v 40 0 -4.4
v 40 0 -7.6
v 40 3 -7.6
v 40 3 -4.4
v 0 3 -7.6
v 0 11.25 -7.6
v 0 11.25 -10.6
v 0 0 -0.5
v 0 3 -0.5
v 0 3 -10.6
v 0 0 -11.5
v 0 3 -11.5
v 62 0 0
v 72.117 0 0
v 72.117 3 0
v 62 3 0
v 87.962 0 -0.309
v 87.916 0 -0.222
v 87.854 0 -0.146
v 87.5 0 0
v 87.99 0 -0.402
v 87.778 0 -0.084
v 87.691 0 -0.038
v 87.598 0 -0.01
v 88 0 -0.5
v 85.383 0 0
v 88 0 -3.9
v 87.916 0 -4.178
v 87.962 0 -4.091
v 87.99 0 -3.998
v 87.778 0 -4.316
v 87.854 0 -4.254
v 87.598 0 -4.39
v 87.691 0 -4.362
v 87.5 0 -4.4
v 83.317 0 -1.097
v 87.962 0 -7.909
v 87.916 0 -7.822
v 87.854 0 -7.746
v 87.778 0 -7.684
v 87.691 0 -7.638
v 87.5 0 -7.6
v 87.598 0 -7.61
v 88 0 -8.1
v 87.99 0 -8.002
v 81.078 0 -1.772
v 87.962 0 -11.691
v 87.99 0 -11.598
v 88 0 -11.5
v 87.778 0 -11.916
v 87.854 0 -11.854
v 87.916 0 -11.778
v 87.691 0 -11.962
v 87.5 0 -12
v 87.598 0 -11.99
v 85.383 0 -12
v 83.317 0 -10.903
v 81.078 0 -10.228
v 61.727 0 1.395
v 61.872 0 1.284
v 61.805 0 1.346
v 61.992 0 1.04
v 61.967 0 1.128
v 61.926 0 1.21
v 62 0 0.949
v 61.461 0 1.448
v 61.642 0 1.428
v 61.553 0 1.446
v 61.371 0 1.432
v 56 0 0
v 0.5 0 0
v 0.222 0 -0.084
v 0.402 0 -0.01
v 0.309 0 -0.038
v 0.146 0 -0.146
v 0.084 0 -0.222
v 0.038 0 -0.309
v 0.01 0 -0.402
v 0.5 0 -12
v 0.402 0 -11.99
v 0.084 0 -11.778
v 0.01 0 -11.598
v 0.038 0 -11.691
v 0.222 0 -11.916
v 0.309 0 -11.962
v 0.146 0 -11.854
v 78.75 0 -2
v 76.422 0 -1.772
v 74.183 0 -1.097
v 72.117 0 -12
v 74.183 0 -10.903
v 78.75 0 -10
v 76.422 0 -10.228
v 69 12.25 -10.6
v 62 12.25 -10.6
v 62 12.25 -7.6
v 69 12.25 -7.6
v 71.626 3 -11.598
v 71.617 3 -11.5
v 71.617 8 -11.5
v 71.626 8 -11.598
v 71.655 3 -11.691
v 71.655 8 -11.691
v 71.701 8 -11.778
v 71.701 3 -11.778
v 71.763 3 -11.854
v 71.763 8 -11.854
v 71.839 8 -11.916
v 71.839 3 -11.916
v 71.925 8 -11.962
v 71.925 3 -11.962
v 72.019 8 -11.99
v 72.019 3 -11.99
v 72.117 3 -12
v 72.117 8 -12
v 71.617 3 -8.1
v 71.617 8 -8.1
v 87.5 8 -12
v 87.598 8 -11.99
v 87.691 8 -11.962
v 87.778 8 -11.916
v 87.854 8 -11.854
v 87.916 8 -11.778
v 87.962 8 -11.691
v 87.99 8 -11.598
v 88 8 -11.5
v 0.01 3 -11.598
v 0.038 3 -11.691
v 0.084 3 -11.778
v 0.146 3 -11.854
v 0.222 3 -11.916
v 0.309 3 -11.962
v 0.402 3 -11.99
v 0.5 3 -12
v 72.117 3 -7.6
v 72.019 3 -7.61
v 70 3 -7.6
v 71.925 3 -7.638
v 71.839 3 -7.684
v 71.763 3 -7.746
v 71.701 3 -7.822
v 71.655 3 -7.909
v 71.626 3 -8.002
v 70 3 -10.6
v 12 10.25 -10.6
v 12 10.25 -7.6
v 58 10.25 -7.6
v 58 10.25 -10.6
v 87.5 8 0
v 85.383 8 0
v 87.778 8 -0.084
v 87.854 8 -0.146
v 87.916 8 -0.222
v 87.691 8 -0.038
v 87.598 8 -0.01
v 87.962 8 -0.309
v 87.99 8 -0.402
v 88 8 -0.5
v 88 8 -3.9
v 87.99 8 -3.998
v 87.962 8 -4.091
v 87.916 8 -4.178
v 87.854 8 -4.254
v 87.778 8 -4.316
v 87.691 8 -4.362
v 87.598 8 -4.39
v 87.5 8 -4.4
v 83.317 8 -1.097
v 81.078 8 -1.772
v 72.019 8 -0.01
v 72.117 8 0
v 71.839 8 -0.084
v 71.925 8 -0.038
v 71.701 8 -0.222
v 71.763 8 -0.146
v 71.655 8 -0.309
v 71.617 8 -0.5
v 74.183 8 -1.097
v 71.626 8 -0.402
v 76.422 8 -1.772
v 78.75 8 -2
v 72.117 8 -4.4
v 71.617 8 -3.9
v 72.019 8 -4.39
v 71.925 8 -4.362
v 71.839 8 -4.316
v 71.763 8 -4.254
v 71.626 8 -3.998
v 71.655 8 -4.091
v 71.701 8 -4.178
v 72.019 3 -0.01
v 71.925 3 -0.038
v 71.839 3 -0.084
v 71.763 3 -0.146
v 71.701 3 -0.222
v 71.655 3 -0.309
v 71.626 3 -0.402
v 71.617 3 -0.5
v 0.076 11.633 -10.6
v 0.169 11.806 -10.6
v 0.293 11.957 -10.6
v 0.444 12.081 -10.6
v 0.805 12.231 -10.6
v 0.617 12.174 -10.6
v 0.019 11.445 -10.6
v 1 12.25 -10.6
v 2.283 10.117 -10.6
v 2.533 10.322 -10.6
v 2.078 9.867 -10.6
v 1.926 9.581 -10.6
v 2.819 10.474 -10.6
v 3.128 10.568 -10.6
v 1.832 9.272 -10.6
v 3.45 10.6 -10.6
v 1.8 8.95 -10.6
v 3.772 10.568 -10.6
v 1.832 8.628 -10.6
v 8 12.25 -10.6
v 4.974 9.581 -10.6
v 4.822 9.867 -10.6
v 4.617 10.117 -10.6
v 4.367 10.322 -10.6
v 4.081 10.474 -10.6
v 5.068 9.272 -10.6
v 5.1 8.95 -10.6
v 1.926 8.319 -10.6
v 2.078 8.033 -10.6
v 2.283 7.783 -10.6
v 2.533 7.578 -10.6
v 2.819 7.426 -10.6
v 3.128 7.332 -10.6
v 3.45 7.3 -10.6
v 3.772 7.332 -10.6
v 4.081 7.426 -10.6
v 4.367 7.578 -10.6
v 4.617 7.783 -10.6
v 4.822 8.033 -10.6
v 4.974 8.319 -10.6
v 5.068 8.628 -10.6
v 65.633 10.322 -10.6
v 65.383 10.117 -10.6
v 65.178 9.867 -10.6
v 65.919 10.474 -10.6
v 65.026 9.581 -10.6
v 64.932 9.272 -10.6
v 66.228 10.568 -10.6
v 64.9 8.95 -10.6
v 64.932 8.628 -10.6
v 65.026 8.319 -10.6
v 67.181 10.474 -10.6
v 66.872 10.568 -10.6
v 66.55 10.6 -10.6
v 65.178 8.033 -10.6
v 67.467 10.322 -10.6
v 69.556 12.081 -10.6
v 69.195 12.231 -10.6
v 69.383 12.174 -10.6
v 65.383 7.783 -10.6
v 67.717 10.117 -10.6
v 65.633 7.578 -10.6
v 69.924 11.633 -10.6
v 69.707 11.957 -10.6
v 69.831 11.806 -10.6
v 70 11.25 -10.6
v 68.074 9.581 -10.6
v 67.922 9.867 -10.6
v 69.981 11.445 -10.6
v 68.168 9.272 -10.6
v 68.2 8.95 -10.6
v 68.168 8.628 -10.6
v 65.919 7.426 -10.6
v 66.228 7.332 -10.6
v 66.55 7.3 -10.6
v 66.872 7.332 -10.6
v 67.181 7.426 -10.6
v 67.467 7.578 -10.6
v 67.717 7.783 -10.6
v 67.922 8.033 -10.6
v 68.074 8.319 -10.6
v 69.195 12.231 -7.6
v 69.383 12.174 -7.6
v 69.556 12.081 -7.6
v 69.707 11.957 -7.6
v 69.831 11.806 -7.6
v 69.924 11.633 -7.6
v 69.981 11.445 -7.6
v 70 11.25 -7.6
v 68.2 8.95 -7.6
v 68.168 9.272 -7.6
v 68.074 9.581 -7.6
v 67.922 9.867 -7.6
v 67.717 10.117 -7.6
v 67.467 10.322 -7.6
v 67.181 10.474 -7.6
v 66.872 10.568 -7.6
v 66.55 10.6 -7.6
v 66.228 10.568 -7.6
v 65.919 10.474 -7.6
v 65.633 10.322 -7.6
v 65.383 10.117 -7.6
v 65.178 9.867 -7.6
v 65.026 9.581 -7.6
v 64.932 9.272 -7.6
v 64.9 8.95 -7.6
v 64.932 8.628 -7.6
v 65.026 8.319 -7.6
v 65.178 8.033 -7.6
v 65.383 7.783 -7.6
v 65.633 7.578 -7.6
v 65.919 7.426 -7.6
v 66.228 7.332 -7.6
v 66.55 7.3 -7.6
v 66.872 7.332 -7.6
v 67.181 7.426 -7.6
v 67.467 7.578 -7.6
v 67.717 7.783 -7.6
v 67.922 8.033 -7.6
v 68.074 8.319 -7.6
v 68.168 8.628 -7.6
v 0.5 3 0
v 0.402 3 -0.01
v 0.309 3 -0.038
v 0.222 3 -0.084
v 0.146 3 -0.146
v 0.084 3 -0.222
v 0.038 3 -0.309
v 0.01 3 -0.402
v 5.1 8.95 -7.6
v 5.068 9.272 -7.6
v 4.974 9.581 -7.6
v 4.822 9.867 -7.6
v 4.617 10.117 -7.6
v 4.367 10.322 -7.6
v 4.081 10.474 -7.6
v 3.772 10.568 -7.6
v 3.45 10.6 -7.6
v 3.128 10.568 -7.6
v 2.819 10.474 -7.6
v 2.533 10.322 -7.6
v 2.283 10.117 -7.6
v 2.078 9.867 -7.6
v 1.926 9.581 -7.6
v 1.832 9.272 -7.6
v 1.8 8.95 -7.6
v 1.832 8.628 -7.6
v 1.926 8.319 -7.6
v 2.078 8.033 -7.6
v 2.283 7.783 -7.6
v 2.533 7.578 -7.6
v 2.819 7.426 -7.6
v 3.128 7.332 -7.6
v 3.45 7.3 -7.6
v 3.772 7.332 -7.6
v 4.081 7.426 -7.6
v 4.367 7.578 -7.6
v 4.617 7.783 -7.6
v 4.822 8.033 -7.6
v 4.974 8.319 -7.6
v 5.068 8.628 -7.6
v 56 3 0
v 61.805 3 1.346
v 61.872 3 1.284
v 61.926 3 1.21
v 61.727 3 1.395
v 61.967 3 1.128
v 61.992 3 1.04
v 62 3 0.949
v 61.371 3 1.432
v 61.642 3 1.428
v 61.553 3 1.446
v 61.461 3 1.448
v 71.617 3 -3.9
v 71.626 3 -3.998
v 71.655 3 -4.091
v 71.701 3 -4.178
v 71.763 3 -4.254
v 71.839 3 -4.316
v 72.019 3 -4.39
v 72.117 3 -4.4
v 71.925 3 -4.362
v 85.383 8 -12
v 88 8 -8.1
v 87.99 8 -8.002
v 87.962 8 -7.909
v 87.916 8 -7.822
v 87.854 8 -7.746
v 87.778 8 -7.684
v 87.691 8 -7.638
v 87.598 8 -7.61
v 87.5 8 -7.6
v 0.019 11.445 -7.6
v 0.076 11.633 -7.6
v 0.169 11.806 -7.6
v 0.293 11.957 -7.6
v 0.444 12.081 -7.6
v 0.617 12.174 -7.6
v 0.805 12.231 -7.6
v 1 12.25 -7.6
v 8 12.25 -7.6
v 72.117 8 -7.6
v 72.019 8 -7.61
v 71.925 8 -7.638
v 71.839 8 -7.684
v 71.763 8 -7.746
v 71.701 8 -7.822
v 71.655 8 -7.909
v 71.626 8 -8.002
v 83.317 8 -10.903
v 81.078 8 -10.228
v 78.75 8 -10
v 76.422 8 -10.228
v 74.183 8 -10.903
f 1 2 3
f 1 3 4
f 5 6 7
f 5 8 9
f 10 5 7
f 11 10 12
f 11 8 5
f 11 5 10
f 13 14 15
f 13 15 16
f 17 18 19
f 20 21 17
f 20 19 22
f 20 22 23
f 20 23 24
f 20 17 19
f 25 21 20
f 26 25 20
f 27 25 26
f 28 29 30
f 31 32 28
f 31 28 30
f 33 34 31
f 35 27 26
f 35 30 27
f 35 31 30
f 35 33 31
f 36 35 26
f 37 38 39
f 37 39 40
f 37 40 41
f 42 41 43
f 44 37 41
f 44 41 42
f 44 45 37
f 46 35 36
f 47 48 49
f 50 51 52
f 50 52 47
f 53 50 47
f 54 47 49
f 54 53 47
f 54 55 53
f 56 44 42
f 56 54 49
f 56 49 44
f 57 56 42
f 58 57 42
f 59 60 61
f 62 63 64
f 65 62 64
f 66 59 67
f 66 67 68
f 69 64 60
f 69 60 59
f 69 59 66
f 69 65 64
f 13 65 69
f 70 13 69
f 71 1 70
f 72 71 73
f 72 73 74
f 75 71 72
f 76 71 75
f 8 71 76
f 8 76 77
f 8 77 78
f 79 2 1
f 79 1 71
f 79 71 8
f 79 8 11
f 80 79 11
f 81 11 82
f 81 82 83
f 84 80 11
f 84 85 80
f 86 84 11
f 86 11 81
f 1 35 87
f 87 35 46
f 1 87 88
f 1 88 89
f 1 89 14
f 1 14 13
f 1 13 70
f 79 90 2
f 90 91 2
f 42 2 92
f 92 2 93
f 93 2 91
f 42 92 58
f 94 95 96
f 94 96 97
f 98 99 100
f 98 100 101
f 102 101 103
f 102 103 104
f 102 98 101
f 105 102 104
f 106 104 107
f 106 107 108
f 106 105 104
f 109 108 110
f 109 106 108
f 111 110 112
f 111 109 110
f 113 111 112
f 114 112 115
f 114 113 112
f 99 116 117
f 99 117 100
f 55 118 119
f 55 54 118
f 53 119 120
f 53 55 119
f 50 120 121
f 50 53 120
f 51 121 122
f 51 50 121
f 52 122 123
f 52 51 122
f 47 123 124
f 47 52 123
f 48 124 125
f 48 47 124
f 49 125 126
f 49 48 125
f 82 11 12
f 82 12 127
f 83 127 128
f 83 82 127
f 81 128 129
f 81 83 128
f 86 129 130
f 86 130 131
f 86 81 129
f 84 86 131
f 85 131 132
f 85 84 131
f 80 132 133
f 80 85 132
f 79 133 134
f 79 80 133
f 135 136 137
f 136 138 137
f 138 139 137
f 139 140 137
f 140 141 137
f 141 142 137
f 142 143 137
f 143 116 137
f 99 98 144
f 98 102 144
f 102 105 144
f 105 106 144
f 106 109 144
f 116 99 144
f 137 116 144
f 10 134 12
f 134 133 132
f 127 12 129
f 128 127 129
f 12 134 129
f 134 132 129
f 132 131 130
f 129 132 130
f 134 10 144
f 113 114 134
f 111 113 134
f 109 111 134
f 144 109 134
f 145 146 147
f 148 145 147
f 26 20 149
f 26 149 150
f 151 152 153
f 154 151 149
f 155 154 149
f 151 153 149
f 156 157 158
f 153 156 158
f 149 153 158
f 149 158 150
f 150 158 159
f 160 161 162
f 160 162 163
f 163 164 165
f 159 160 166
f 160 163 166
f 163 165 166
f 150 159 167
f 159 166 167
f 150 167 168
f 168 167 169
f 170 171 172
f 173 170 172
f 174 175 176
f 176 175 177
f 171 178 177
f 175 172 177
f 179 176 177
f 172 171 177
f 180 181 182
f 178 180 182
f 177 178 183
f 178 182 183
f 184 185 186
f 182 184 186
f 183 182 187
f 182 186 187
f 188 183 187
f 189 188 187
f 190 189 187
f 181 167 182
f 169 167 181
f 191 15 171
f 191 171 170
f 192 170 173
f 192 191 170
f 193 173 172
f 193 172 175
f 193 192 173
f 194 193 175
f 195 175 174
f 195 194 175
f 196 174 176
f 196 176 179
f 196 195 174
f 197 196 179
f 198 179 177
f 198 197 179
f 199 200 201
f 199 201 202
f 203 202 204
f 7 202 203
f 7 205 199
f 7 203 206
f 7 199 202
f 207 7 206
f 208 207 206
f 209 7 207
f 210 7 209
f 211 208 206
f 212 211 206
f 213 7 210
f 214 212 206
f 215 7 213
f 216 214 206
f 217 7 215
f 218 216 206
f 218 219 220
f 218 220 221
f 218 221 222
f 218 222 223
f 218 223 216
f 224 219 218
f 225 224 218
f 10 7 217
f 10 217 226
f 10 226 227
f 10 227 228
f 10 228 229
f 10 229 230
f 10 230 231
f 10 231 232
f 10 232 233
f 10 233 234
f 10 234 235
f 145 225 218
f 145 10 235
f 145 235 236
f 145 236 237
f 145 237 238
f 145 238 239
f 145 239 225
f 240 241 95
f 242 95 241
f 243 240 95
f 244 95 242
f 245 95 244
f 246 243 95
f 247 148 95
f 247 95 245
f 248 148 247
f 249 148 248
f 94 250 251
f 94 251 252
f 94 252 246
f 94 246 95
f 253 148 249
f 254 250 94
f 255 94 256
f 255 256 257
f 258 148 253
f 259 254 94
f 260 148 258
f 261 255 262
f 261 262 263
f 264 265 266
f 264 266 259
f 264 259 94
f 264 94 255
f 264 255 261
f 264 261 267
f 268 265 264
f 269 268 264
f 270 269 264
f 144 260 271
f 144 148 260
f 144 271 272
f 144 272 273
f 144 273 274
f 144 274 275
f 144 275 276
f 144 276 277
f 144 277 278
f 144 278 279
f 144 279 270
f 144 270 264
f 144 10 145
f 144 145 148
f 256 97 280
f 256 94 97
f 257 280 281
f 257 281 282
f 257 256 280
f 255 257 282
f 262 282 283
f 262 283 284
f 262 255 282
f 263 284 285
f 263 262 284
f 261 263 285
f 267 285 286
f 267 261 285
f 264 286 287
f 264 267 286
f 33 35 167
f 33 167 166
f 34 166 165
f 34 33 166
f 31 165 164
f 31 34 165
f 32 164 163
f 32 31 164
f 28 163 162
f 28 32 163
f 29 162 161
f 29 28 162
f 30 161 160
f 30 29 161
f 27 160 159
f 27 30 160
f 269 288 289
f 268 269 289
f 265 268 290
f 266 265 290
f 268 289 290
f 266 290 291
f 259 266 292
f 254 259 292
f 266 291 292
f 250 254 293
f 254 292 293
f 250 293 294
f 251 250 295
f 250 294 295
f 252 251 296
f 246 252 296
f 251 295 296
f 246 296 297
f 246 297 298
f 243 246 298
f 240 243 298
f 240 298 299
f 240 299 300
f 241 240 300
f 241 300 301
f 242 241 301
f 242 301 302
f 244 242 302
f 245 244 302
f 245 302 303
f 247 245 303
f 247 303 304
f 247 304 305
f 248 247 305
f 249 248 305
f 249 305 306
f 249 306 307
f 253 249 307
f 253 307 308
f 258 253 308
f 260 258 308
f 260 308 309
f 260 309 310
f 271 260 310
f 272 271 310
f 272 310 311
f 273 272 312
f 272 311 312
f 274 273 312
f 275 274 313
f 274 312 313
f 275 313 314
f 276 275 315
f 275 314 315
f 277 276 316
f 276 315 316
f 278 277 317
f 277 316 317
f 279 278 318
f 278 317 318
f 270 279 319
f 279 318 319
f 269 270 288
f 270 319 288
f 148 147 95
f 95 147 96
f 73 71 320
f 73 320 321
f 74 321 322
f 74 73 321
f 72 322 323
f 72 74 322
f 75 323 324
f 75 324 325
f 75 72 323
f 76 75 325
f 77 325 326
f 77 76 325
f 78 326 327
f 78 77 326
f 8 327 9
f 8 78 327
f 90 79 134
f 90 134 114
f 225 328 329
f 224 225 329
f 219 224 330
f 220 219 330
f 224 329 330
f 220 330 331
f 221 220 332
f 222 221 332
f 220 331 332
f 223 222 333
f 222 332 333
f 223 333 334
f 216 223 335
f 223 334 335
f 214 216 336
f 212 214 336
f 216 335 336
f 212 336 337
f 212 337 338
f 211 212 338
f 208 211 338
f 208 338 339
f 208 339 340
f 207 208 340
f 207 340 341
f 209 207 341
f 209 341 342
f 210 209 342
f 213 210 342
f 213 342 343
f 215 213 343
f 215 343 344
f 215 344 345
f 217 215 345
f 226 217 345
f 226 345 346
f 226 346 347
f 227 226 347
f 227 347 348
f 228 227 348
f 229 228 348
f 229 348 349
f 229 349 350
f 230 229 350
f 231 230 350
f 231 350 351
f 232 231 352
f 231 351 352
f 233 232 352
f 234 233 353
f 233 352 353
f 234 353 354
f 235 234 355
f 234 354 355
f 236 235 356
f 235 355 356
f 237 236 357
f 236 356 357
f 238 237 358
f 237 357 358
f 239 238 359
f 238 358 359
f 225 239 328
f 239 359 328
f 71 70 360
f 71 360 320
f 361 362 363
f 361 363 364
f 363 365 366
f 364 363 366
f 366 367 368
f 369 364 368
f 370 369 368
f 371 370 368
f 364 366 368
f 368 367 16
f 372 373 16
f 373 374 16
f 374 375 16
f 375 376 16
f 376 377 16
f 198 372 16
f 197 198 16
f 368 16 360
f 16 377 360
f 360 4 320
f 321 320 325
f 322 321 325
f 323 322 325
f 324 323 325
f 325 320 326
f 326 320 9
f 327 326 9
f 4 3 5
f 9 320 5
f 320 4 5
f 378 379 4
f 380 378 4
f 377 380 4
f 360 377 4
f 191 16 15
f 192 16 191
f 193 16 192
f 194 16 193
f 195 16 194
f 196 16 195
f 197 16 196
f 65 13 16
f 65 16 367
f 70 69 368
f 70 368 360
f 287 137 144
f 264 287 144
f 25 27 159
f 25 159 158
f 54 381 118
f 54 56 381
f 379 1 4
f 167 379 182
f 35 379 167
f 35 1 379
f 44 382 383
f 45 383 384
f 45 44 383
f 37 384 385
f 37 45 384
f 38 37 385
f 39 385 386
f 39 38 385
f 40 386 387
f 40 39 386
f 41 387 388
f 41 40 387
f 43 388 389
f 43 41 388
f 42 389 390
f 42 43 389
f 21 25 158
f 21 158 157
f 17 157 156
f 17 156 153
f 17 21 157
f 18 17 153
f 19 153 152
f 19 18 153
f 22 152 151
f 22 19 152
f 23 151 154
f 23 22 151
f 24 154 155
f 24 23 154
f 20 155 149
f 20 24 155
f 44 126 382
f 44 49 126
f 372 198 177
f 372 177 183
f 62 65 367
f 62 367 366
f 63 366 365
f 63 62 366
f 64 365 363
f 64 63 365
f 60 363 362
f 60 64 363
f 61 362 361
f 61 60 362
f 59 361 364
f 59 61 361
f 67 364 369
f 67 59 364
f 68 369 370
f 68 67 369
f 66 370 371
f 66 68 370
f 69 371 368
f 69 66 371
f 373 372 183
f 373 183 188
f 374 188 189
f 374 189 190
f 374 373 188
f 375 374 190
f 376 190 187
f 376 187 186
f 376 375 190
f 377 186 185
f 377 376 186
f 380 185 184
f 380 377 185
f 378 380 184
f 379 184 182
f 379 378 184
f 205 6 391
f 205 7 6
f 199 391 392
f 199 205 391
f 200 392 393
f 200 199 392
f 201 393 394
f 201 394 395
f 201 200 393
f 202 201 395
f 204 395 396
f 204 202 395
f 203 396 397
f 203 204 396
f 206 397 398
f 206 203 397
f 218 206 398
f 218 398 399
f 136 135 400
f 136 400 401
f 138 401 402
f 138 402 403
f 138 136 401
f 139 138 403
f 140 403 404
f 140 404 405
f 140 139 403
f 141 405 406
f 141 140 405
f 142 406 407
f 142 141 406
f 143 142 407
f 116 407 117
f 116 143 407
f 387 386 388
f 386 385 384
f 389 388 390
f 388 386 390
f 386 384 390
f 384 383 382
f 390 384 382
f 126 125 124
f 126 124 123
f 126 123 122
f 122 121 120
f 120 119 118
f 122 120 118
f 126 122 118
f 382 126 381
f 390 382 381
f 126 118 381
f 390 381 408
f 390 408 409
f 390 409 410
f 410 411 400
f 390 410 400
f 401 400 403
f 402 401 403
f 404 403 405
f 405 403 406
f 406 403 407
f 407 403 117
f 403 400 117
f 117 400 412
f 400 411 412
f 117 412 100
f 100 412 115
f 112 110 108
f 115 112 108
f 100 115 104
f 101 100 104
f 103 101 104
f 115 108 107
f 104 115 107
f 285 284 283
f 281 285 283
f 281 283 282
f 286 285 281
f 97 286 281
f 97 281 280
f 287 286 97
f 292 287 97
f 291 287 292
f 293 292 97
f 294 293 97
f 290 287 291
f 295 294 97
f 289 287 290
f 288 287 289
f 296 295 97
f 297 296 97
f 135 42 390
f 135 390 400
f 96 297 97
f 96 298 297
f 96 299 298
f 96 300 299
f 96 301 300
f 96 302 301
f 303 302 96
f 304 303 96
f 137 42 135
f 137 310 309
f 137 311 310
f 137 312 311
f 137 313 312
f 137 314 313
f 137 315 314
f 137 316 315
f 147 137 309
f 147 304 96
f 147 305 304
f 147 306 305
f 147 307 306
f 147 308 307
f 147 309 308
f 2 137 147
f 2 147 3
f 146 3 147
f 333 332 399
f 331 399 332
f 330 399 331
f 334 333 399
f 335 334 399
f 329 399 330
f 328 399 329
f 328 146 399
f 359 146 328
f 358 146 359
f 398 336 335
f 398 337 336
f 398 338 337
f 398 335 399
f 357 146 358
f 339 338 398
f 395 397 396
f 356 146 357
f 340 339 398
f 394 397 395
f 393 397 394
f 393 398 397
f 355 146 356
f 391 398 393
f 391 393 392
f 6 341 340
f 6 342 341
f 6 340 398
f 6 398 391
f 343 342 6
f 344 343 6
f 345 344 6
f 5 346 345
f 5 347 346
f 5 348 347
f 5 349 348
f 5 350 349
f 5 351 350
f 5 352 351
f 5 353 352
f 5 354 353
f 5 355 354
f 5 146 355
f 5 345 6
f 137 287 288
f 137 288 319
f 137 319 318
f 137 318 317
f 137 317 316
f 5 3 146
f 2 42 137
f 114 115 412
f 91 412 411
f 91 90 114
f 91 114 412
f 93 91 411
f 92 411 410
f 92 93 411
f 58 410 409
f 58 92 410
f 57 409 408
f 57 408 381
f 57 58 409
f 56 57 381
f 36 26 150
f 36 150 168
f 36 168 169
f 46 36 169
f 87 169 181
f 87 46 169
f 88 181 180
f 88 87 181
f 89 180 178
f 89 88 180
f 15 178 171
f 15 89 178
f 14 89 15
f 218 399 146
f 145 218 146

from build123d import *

# Parameters (mm, degrees)
EXTRUDE_1_DEPTH     = 3
SKETCH_4_W          = 70
SKETCH_4_H          = 3
EXTRUDE_2_DEPTH     = 9.25
CUT_EXTRUDE_1_REACH = 91.308
SKETCH_5_R          = 1.65
FILLET_1_R          = 1
EXTRUDE_3_DEPTH     = 5
CUT_EXTRUDE_2_REACH = 91.308


with BuildPart() as part:
    # ｽｹｯﾁ2 → ﾎﾞｽ - 押し出し1 (new body)
    with BuildSketch(Plane(origin=(0, 0, 0), x_dir=(1, 0, 0), z_dir=(0, 1, 0))):
        with BuildLine():
            Line((70, 7.6), (40, 7.6))
            Line((40, 7.6), (40, 4.4))
            Line((40, 4.4), (70, 4.4))
            Line((70, 4.4), (87.5, 4.4))
            ThreePointArc((87.5, 4.4), (87.853553391, 4.253553391), (88, 3.9))
            Line((88, 3.9), (88, 0.5))
            ThreePointArc((88, 0.5), (87.853553391, 0.146446609), (87.5, 0))
            Line((87.5, 0), (85.383249581, 0))
            ThreePointArc((85.383249581, 0), (78.75, 2), (72.116750419, 0))
            Line((72.116750419, 0), (70, 0))
            Line((70, 0), (62, 0))
            Line((62, 0), (62, -0.949194177))
            ThreePointArc((62, -0.949194177), (61.80461807, -1.345688605), (61.371168675, -1.432311647))
            Line((61.371168675, -1.432311647), (56, 0))
            Line((56, 0), (0.5, 0))
            ThreePointArc((0.5, 0), (0.146446609, 0.146446609), (0, 0.5))
            Line((0, 0.5), (0, 11.5))
            ThreePointArc((0, 11.5), (0.146446609, 11.853553391), (0.5, 12))
            Line((0.5, 12), (70, 12))
            Line((70, 12), (72.116750419, 12))
            ThreePointArc((72.116750419, 12), (78.75, 10), (85.383249581, 12))
            Line((85.383249581, 12), (87.5, 12))
            ThreePointArc((87.5, 12), (87.853553391, 11.853553391), (88, 11.5))
            Line((88, 11.5), (88, 8.1))
            ThreePointArc((88, 8.1), (87.853553391, 7.746446609), (87.5, 7.6))
            Line((87.5, 7.6), (70, 7.6))
        make_face()
    extrude(amount=EXTRUDE_1_DEPTH)

    # ｽｹｯﾁ4 → ﾎﾞｽ - 押し出し2 (add)
    with BuildSketch(Plane(origin=(0, 3, 0), x_dir=(1, 0, 0), z_dir=(0, 1, 0))):
        with Locations((35, 9.1)):
            Rectangle(SKETCH_4_W, SKETCH_4_H)
    extrude(amount=EXTRUDE_2_DEPTH)

    # ｽｹｯﾁ5 → ｶｯﾄ - 押し出し1 (cut, up to next)
    with BuildSketch(Plane.XY.offset(-7.6), mode=Mode.PRIVATE) as cut_extrude_1_sk1:
        with Locations((3.45, 8.95)):
            Circle(SKETCH_5_R)
    cut_extrude_1_tool1 = extrude(cut_extrude_1_sk1.sketch, amount=-CUT_EXTRUDE_1_REACH, mode=Mode.PRIVATE) & part.part
    # ｽｹｯﾁ5 → ｶｯﾄ - 押し出し1 (cut, up to next)
    with BuildSketch(Plane.XY.offset(-7.6), mode=Mode.PRIVATE) as cut_extrude_1_sk2:
        with Locations((66.55, 8.95)):
            Circle(SKETCH_5_R)
    cut_extrude_1_tool2 = extrude(cut_extrude_1_sk2.sketch, amount=-CUT_EXTRUDE_1_REACH, mode=Mode.PRIVATE) & part.part
    add(cut_extrude_1_tool1.solids().sort_by_distance((3.45, 8.95, -7.6))[0], mode=Mode.SUBTRACT)
    add(cut_extrude_1_tool2.solids().sort_by_distance((66.55, 8.95, -7.6))[0], mode=Mode.SUBTRACT)

    # ﾌｨﾚｯﾄ1
    fillet_1_edges = [part.edges().sort_by_distance(p)[0] for p in [
        (70, 12.25, -9.1),
        (0, 12.25, -9.1),
    ]]
    fillet(fillet_1_edges, radius=FILLET_1_R)

    # ｽｹｯﾁ6 → ﾎﾞｽ - 押し出し3 (add)
    with BuildSketch(Plane(origin=(0, 3, 0), x_dir=(1, 0, 0), z_dir=(0, 1, 0))):
        with BuildLine():
            Line((88, 11.5), (88, 8.1))
            ThreePointArc((88, 8.1), (87.853553391, 7.746446609), (87.5, 7.6))
            Line((87.5, 7.6), (72.116750419, 7.6))
            ThreePointArc((72.116750419, 7.6), (71.763197029, 7.746446609), (71.616750419, 8.1))
            Line((71.616750419, 8.1), (71.616750419, 11.5))
            ThreePointArc((71.616750419, 11.5), (71.763197029, 11.853553391), (72.116750419, 12))
            ThreePointArc((72.116750419, 12), (78.75, 10), (85.383249581, 12))
            Line((85.383249581, 12), (87.5, 12))
            ThreePointArc((87.5, 12), (87.853553391, 11.853553391), (88, 11.5))
        make_face()
        with BuildLine():
            Line((88, 3.9), (88, 0.5))
            ThreePointArc((88, 0.5), (87.853553391, 0.146446609), (87.5, 0))
            Line((87.5, 0), (85.383249581, 0))
            ThreePointArc((85.383249581, 0), (78.75, 2), (72.116750419, 0))
            ThreePointArc((72.116750419, 0), (71.763197029, 0.146446609), (71.616750419, 0.5))
            Line((71.616750419, 0.5), (71.616750419, 3.9))
            ThreePointArc((71.616750419, 3.9), (71.763197029, 4.253553391), (72.116750419, 4.4))
            Line((72.116750419, 4.4), (87.5, 4.4))
            ThreePointArc((87.5, 4.4), (87.853553391, 4.253553391), (88, 3.9))
        make_face()
    extrude(amount=EXTRUDE_3_DEPTH)

    # ｽｹｯﾁ7 → ｶｯﾄ - 押し出し2 (cut, up to next)
    with BuildSketch(Plane.XY.offset(-7.6), mode=Mode.PRIVATE) as cut_extrude_2_sk1:
        Polygon((8, 12.25), (12, 10.25), (58, 10.25), (62, 12.25), align=None)
    cut_extrude_2_tool1 = extrude(cut_extrude_2_sk1.sketch, amount=-CUT_EXTRUDE_2_REACH, mode=Mode.PRIVATE) & part.part
    add(cut_extrude_2_tool1.solids().sort_by_distance((35, 11.276667, -7.6))[0], mode=Mode.SUBTRACT)


solid = part.part
